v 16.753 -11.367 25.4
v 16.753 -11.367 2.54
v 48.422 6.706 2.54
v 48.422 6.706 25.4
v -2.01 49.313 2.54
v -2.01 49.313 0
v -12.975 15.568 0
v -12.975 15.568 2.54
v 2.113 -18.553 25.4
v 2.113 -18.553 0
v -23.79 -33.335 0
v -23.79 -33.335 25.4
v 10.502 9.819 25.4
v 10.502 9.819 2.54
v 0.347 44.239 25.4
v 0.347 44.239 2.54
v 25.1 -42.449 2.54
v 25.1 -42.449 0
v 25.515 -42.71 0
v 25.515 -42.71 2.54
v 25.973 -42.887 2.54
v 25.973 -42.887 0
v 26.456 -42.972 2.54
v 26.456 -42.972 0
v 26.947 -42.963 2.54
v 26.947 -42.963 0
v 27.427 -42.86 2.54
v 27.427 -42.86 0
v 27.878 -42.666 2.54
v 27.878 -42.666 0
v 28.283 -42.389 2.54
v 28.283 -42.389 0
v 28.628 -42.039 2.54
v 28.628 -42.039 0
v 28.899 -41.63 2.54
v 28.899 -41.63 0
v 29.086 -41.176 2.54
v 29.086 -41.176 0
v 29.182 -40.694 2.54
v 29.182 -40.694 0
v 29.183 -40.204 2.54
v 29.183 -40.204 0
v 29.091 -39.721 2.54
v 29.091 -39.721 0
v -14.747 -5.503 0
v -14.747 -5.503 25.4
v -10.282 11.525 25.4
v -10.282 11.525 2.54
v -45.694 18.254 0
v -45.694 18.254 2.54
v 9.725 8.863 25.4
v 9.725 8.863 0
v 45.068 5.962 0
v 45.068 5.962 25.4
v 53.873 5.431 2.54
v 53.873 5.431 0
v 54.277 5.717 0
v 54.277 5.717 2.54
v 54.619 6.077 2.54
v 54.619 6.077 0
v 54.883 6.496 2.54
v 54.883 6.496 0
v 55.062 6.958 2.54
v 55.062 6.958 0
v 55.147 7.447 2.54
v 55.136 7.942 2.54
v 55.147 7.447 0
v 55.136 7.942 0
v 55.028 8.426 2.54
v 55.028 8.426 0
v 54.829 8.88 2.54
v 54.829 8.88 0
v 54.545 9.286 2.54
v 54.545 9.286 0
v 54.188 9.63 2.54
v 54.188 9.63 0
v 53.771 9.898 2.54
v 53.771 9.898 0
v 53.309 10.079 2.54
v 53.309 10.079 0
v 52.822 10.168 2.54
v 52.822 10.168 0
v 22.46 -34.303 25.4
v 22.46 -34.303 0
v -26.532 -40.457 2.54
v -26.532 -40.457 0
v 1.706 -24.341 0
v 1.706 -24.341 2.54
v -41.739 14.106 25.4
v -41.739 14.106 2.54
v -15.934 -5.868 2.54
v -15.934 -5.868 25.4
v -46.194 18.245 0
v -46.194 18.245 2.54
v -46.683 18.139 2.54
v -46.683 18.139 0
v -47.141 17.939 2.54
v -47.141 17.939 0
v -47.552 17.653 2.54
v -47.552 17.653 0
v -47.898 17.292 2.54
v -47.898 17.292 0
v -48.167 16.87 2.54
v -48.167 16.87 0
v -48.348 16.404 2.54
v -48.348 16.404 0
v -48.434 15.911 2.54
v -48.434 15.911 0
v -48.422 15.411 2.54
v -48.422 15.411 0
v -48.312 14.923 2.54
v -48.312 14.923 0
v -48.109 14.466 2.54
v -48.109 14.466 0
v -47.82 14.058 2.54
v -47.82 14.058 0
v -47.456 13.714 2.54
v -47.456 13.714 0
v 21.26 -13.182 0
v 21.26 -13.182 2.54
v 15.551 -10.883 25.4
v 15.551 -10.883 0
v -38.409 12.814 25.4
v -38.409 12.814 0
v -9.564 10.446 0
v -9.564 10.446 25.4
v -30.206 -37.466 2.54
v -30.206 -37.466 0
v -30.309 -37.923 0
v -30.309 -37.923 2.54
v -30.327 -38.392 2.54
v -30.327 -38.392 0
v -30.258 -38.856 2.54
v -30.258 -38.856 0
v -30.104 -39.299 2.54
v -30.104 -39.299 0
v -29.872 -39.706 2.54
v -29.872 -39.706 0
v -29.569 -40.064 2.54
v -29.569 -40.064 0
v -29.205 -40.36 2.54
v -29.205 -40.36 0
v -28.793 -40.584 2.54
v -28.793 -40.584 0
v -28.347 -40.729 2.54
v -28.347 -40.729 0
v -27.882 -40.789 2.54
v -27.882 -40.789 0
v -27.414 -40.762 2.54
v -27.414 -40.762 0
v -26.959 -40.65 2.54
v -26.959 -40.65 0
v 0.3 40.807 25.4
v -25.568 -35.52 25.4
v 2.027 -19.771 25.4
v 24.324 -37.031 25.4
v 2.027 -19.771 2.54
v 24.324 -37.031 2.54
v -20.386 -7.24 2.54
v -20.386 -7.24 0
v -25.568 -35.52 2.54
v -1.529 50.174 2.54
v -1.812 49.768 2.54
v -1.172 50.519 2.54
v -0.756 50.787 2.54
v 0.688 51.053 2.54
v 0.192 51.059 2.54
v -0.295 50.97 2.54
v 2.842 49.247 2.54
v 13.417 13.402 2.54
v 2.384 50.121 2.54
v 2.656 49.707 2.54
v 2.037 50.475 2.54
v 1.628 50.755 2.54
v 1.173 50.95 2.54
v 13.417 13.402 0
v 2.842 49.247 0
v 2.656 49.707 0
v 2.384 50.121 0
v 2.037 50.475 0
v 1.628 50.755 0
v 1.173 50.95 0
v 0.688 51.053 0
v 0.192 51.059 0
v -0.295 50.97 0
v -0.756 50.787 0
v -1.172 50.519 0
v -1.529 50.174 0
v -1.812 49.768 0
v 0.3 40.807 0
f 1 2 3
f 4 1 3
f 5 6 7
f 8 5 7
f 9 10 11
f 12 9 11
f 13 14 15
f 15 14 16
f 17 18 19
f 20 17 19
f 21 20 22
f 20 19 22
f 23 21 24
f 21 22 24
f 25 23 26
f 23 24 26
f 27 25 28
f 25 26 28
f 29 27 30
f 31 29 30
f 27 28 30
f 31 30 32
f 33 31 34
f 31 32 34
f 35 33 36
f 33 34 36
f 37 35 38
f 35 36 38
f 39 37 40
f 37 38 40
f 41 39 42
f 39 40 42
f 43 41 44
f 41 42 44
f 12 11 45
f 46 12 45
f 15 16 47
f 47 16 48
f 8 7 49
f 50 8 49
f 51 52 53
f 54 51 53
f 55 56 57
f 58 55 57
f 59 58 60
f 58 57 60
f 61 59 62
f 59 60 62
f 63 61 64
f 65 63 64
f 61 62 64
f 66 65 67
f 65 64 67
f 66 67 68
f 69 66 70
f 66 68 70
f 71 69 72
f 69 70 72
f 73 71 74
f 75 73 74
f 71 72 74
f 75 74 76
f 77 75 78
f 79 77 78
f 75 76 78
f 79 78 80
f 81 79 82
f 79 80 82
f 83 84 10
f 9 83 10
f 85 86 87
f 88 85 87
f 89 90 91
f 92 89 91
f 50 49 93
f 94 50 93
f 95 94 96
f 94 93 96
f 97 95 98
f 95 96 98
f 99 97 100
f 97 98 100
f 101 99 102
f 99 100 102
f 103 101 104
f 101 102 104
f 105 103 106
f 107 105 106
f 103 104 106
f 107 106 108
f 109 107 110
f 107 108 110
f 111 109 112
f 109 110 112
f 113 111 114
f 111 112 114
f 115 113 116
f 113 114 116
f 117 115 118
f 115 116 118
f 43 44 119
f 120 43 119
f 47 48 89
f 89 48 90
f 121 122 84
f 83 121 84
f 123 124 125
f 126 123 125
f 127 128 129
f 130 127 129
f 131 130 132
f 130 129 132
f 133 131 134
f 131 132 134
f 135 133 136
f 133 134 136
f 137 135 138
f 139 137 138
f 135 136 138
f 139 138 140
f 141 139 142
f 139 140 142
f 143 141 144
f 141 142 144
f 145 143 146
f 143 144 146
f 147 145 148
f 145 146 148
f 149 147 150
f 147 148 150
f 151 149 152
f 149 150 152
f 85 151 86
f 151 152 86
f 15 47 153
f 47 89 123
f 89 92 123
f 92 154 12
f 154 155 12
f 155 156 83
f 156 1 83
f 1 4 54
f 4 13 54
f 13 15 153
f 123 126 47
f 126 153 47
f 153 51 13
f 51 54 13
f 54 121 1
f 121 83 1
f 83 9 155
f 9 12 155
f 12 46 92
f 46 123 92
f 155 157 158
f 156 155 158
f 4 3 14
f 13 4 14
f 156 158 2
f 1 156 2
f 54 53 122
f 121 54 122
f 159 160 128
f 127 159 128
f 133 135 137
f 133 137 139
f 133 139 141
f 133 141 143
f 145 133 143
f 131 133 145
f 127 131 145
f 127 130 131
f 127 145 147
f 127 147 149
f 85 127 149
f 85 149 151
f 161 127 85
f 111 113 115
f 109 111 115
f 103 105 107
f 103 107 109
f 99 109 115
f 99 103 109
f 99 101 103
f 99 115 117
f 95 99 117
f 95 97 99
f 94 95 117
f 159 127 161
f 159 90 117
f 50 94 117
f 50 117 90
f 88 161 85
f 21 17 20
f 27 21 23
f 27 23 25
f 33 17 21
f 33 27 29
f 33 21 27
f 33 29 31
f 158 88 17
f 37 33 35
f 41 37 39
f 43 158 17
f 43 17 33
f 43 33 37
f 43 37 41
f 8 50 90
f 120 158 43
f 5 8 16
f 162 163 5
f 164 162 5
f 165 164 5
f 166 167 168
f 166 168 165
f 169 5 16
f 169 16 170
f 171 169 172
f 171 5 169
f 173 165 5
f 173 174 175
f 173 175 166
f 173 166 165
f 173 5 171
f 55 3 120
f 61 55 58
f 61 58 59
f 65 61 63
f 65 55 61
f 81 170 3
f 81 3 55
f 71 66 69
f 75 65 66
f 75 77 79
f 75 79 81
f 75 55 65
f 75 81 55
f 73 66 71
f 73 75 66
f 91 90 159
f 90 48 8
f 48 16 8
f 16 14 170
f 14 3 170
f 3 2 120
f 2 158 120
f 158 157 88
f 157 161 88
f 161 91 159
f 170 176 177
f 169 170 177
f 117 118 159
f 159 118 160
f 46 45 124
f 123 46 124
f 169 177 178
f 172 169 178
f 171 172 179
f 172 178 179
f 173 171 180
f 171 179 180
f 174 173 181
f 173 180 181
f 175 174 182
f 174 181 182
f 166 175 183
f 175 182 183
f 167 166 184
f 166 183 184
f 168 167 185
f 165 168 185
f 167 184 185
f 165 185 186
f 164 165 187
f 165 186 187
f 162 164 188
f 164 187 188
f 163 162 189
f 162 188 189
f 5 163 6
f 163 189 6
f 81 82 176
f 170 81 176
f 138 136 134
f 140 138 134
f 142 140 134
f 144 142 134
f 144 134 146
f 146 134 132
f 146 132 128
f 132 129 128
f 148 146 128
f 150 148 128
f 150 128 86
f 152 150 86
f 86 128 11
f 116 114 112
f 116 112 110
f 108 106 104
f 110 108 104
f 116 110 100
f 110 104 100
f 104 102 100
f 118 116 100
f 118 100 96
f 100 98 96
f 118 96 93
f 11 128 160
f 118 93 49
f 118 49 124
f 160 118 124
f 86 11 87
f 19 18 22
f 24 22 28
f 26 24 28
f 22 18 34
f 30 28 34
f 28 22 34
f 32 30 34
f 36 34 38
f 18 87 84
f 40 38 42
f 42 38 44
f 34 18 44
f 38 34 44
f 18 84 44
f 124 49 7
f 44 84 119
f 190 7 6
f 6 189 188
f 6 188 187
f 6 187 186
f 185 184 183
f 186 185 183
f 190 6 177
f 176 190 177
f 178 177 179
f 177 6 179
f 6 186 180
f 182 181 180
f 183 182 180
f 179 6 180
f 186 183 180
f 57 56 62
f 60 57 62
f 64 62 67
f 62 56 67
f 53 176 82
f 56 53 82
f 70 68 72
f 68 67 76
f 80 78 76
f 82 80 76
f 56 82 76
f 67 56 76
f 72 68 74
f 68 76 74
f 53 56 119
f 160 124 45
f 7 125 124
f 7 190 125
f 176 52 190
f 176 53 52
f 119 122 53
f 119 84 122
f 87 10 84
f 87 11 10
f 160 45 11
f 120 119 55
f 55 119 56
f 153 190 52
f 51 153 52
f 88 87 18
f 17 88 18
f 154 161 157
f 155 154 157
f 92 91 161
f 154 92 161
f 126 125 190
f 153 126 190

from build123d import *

# Parameters (mm, degrees)
F1_DEPTH = 25.4
F2_DEPTH = 2.54


with BuildPart() as f1:
    # F0 (on Top) → F1 (new body)
    with BuildSketch(Plane.XY):
        Polygon((0.34709, 44.238659), (-10.282353, 11.524596), (-41.738984, 14.106456), (-15.933683, -5.868411), (-25.568001, -35.51979), (2.027153, -19.771187), (24.324346, -37.030565), (16.752772, -11.367249), (48.421839, 6.706344), (10.502188, 9.818668), align=None)
        Polygon((-9.564442, 10.446256), (0.300305, 40.806824), (9.724831, 8.863055), (45.068132, 5.962189), (15.550736, -10.883441), (22.460278, -34.302848), (2.112672, -18.552568), (-23.789904, -33.335215), (-14.746518, -5.502534), (-38.409092, 12.813733), align=None, mode=Mode.SUBTRACT)
    extrude(amount=F1_DEPTH)

    # F0 (on Top) → F2 (join)
    with BuildSketch(Plane.XY):
        with BuildLine():
            Line((29.090617, -39.721459), (21.260413, -13.181531))
            Line((21.260413, -13.181531), (53.872965, 5.430511))
            ThreePointArc((53.872965, 5.430511), (55.09367, 8.186757), (52.821757, 10.168026))
            Line((52.821757, 10.168026), (13.417279, 13.40222))
            Line((13.417279, 13.40222), (2.841755, 49.247218))
            ThreePointArc((2.841755, 49.247218), (0.440196, 51.068223), (-2.010111, 49.313362))
            Line((-2.010111, 49.313362), (-12.974523, 15.568374))
            Line((-12.974523, 15.568374), (-45.693581, 18.25385))
            ThreePointArc((-45.693581, 18.25385), (-48.269186, 16.641595), (-47.45611, 13.713795))
            Line((-47.45611, 13.713795), (-20.385559, -7.240452))
            Line((-20.385559, -7.240452), (-30.206309, -37.465611))
            ThreePointArc((-30.206309, -37.465611), (-29.39403, -40.220462), (-26.531641, -40.456542))
            Line((-26.531641, -40.456542), (1.706455, -24.34101))
            Line((1.706455, -24.34101), (25.099682, -42.448785))
            ThreePointArc((25.099682, -42.448785), (28.087545, -42.53731), (29.090617, -39.721459))
        make_face()
        Polygon((-41.738984, 14.106456), (-10.282353, 11.524596), (0.34709, 44.238659), (10.502188, 9.818668), (48.421839, 6.706344), (16.752772, -11.367249), (24.324346, -37.030565), (2.027153, -19.771187), (-25.568001, -35.51979), (-15.933683, -5.868411), align=None, mode=Mode.SUBTRACT)
    extrude(amount=F2_DEPTH)


solid = f1.part
